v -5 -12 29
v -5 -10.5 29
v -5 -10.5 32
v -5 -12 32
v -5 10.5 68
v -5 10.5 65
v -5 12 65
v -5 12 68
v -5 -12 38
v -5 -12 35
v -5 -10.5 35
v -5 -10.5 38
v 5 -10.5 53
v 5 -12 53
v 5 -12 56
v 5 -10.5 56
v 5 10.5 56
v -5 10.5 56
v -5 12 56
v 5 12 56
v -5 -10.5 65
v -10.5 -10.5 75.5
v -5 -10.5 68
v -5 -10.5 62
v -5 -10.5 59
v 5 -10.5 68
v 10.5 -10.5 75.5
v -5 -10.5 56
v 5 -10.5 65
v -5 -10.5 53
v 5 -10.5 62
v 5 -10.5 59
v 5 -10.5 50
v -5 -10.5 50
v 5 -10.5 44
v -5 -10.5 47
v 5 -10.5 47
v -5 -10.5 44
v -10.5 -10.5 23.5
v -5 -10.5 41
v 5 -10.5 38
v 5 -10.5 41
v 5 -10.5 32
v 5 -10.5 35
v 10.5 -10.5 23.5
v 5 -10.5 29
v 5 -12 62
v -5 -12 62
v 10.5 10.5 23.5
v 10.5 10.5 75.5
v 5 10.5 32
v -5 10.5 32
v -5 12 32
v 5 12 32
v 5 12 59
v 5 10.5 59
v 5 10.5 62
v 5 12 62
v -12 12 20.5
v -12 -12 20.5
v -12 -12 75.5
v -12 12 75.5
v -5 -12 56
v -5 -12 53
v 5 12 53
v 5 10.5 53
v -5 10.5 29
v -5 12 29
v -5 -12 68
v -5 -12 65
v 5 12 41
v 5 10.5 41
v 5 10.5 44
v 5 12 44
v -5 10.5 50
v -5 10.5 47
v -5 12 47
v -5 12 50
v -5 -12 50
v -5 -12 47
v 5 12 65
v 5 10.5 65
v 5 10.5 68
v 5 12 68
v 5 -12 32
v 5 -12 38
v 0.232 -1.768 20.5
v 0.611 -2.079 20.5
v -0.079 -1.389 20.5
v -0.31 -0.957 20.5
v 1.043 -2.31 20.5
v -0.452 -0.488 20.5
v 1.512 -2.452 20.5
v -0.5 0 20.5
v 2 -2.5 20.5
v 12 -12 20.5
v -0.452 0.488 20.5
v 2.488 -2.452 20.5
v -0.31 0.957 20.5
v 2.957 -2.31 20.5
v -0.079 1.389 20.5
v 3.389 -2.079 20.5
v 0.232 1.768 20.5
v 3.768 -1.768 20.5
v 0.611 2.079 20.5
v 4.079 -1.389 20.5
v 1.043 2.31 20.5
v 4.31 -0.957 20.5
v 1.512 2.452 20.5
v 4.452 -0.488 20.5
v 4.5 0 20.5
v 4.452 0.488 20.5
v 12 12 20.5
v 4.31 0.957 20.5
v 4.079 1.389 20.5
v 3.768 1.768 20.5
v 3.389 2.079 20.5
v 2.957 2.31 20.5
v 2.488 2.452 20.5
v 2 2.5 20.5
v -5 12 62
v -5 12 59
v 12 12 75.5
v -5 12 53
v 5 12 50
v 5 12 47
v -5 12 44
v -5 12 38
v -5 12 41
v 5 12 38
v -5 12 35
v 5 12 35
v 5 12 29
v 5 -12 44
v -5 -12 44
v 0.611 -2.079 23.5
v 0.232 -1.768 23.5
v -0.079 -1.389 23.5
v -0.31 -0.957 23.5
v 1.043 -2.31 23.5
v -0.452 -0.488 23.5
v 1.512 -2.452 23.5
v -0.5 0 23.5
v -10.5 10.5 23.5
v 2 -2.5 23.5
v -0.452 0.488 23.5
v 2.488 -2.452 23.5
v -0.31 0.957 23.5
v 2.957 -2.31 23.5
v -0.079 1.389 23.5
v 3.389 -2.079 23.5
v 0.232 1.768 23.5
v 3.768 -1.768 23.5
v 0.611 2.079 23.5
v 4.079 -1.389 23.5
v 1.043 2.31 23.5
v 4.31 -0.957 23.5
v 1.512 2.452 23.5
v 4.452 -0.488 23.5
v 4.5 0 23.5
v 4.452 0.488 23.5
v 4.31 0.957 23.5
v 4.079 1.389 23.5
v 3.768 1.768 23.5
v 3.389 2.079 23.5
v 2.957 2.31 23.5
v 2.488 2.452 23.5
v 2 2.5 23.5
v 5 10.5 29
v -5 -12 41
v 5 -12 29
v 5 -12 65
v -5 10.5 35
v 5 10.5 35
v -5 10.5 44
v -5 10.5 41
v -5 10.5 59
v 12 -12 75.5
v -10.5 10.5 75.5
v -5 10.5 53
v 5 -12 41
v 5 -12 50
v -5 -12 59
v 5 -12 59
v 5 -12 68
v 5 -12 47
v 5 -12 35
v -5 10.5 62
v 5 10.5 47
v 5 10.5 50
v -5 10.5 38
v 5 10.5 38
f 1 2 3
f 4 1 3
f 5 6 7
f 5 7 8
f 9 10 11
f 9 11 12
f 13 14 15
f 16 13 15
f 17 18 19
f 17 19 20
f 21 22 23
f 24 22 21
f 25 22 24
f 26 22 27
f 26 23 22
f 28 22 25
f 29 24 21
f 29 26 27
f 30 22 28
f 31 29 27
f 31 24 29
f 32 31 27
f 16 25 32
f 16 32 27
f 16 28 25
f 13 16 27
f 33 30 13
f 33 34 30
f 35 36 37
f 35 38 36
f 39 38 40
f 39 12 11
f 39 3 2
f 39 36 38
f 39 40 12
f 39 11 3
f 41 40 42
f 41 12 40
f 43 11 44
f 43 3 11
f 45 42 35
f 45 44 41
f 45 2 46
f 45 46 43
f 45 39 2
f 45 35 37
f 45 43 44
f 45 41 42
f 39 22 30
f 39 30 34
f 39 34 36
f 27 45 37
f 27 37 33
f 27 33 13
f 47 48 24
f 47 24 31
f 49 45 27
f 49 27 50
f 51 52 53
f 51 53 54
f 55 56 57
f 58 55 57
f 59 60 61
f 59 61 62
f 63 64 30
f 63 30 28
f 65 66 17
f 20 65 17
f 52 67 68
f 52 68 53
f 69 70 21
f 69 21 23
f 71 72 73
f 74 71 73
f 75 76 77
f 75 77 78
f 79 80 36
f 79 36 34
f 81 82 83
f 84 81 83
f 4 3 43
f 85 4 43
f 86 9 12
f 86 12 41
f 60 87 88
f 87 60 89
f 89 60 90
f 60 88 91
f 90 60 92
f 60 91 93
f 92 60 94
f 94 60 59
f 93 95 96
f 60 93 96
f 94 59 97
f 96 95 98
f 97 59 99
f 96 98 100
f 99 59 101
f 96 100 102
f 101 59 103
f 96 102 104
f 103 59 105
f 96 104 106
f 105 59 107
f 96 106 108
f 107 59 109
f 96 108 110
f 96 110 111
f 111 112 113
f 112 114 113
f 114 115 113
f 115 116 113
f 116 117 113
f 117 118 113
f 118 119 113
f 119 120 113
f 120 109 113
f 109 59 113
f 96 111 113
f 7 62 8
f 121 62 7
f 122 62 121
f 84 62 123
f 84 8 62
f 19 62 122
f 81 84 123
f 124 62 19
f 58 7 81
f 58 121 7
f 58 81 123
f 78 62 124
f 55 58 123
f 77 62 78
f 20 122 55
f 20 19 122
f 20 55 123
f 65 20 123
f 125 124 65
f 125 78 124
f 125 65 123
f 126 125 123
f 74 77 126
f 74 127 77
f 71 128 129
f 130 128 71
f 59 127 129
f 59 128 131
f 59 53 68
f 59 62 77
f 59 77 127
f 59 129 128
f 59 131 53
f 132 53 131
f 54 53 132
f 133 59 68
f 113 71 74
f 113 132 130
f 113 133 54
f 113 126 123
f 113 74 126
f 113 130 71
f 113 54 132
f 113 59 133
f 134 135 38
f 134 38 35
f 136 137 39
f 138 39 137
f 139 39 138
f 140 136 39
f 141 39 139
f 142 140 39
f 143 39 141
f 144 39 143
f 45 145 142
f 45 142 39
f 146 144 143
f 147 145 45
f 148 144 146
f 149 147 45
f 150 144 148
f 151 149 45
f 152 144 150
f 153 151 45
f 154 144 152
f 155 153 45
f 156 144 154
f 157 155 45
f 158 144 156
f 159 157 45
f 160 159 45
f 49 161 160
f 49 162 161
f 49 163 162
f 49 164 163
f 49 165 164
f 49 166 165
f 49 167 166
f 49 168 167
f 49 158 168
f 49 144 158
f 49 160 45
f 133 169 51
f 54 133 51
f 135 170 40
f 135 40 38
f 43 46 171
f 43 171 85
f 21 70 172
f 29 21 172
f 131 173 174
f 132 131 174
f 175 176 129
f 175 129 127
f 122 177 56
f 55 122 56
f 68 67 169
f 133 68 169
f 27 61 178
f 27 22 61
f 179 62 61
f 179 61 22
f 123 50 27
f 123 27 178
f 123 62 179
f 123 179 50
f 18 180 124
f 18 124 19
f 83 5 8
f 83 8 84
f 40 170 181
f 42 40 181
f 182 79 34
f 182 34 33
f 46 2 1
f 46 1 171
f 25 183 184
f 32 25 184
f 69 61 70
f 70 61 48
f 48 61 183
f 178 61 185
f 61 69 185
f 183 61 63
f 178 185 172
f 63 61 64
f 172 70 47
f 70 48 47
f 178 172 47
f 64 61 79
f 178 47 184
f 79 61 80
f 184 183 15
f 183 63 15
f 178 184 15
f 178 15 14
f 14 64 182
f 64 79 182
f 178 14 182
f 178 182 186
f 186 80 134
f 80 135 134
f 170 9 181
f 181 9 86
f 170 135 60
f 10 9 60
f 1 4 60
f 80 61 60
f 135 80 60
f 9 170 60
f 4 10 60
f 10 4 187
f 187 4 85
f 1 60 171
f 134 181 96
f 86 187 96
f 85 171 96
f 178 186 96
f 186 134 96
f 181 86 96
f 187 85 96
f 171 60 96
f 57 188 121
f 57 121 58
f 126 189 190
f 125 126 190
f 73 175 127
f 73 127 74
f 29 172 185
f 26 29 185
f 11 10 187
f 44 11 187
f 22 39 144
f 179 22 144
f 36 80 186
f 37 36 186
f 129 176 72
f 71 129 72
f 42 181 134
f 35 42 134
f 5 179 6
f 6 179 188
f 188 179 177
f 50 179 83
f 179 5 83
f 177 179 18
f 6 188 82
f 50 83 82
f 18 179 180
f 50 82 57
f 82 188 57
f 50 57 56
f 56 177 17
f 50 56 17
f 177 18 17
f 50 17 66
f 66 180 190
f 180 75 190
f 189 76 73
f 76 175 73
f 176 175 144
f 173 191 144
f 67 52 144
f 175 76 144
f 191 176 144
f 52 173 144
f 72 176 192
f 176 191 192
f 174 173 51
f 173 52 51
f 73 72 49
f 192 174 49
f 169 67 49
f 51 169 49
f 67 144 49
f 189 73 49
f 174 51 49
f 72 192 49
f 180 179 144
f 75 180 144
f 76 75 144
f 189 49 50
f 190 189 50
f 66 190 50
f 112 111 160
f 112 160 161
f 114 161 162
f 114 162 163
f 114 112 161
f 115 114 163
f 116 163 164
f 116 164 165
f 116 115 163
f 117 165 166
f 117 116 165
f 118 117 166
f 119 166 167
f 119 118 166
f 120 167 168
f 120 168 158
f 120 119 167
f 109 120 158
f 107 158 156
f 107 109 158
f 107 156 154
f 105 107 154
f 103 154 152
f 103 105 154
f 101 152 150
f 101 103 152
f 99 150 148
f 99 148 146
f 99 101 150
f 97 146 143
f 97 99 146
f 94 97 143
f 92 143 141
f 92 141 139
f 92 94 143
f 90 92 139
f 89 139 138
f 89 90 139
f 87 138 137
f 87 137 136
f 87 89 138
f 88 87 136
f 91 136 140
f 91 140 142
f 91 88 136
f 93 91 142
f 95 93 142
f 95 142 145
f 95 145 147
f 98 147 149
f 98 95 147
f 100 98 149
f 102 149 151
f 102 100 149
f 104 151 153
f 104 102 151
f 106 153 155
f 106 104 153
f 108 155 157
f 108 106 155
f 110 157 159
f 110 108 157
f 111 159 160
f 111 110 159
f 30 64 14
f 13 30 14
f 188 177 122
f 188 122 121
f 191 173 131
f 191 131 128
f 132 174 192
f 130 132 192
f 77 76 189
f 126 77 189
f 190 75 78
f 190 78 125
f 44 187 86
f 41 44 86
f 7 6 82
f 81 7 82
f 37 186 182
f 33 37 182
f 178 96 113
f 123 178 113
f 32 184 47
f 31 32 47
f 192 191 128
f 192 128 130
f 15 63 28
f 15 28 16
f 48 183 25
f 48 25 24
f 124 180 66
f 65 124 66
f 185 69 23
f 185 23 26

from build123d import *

# Parameters (mm, degrees)
SKETCH007_W          = 21
SKETCH007_H          = 21
SKETCH007_R          = 2.5
PAD006_DEPTH         = 3
SKETCH008_W          = 24
SKETCH008_H          = 24
SKETCH008_W_2        = 21
SKETCH008_H_2        = 21
PAD007_DEPTH         = 55
SKETCH009_W          = 10
SKETCH009_H          = 3
POCKET001_DEPTH      = 20
POCKET001_DEPTH_BACK = 20
LINEARPATTERN_COUNT  = 7
LINEARPATTERN_PITCH  = 6


with BuildPart() as part:
    # Sketch007 → Pad006 (new body)
    with BuildSketch(Plane.XY):
        Rectangle(SKETCH007_W, SKETCH007_H)
        with Locations((2, 0)):
            Circle(SKETCH007_R, mode=Mode.SUBTRACT)
    extrude(amount=PAD006_DEPTH)

    # Sketch008 → Pad007 (join)
    with BuildSketch(Plane.XY):
        Rectangle(SKETCH008_W, SKETCH008_H)
        Rectangle(SKETCH008_W_2, SKETCH008_H_2, mode=Mode.SUBTRACT)
    extrude(amount=PAD007_DEPTH)

    # Sketch009 → Pocket001 (cut, two sides)
    with BuildSketch(Plane.XZ) as pocket001_sk:
        with Locations((0, 10)):
            Rectangle(SKETCH009_W, SKETCH009_H)
    pocket001 = extrude(amount=-POCKET001_DEPTH, mode=Mode.SUBTRACT) + extrude(pocket001_sk.sketch, amount=POCKET001_DEPTH_BACK, mode=Mode.SUBTRACT)

    # LinearPattern: Pocket001 ×7
    with Locations(*[(0, 0, i * LINEARPATTERN_PITCH) for i in range(1, LINEARPATTERN_COUNT)]):
        add(pocket001, mode=Mode.SUBTRACT)


with BuildPart() as part_1:
    # Body002 placement: moved
    add(part.part.moved(Location((0, 0, 20.5))))


solid = part_1.part
